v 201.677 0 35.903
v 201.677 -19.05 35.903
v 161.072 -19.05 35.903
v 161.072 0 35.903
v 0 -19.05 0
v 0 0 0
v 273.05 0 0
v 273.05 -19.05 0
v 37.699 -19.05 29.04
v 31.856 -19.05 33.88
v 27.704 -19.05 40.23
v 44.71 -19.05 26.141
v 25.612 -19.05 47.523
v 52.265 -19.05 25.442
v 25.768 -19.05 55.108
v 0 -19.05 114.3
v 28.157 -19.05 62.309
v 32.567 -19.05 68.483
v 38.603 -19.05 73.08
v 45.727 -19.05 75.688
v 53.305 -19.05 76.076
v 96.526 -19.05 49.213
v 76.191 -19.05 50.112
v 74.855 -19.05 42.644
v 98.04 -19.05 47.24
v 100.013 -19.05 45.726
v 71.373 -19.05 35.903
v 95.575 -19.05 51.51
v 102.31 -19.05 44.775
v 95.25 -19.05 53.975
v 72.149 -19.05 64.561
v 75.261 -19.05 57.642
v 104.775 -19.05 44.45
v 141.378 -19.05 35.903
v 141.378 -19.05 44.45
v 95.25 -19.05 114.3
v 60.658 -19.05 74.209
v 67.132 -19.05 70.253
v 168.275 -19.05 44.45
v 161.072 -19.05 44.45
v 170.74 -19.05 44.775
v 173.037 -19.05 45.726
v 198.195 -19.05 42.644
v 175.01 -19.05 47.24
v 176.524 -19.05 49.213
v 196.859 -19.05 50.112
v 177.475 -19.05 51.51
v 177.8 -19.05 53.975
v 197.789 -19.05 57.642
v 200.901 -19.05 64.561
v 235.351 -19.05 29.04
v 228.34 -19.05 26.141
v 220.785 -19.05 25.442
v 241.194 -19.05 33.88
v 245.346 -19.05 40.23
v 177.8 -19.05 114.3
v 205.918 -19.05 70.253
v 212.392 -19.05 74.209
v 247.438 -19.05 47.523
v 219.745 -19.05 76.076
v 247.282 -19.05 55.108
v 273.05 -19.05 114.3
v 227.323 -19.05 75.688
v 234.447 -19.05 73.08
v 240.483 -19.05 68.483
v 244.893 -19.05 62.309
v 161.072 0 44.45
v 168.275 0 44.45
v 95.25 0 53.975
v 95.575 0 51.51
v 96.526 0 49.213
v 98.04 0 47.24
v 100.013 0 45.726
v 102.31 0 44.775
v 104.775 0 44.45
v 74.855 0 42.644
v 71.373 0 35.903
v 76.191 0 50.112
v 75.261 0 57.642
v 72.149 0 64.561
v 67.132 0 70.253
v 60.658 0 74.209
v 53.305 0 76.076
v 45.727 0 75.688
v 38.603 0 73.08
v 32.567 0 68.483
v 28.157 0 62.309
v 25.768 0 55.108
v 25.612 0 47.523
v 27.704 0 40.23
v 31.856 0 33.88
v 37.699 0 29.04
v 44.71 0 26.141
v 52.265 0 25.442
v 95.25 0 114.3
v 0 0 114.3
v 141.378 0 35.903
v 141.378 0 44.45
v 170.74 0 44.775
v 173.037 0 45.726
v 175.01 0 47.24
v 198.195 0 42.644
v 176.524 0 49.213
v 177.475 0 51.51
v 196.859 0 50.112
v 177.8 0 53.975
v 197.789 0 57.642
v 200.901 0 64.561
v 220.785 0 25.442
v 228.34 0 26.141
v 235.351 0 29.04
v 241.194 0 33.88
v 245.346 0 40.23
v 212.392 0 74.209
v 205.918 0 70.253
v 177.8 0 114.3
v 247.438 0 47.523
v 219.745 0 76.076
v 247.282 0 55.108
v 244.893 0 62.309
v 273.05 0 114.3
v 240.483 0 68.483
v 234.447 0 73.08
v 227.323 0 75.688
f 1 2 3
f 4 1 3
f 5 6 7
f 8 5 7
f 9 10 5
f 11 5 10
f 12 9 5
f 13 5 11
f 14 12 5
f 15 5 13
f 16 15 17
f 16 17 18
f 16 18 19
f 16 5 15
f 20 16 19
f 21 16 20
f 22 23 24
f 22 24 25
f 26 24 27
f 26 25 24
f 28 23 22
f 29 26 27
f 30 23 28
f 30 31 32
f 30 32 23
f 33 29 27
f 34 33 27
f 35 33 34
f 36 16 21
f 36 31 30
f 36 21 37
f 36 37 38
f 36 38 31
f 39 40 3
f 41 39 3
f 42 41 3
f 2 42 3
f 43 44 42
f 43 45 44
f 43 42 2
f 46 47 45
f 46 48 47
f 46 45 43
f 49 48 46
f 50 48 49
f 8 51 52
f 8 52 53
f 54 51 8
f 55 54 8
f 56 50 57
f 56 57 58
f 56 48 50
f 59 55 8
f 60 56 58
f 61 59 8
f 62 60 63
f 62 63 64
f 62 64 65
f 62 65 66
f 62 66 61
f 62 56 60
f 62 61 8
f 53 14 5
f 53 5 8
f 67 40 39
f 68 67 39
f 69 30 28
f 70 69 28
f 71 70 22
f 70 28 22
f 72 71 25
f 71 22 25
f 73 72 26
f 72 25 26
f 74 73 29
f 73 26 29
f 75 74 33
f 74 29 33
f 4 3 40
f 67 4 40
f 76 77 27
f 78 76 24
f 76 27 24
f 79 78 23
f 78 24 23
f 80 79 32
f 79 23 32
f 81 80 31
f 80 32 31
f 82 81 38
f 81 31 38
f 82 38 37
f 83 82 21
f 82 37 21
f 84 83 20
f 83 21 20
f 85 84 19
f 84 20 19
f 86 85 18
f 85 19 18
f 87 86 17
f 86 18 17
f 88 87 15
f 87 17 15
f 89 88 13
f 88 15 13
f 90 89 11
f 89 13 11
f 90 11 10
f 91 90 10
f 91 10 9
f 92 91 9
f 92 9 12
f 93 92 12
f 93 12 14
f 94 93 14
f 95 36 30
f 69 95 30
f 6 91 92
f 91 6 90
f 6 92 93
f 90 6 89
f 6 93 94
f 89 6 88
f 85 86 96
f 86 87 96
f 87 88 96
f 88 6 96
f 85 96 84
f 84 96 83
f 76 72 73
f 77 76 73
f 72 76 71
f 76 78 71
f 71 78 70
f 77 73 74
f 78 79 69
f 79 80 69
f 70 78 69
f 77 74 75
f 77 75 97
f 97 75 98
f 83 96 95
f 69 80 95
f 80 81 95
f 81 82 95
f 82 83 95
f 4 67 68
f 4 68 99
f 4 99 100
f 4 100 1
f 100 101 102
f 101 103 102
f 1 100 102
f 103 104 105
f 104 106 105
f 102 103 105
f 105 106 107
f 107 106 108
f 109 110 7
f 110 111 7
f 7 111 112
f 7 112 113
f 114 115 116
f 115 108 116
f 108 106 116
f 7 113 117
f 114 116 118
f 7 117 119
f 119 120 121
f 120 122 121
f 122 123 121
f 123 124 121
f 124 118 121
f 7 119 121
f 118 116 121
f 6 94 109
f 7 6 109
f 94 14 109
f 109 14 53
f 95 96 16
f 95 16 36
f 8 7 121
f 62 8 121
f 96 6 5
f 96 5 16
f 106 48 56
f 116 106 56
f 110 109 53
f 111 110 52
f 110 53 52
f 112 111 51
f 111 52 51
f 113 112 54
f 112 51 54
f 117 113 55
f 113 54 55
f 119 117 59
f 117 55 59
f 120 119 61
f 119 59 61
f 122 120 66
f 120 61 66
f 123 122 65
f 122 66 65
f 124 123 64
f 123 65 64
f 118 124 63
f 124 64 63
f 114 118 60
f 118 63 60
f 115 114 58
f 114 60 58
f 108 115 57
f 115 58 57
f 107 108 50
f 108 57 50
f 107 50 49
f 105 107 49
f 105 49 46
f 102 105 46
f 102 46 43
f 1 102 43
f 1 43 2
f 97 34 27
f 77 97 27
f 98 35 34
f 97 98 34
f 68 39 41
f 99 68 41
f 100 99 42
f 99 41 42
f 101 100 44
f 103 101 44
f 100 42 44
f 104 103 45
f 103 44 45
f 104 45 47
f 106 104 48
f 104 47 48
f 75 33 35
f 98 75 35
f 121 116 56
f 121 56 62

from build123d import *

# Parameters (mm, degrees)
F0_W     = 273.05
F0_H     = 114.3
F1_DEPTH = 19.05
F2_R     = 25.4
F3_DEPTH = 25.4
F5_DEPTH = 25.4
F7_DEPTH = 25.4


with BuildPart() as f1:
    # F0 (on Front) → F1 (new body)
    with BuildSketch(Plane.XZ):
        with Locations((136.525, 57.15)):
            Rectangle(F0_W, F0_H)
    extrude(amount=F1_DEPTH)

    # F2 (on face) → F3 (cut)
    with BuildSketch(Plane.XZ.offset(19.05)):
        with Locations((50.8, 50.8)):
            Circle(F2_R)
        with Locations((222.25, 50.8)):
            Circle(F2_R)
    extrude(amount=-F3_DEPTH, mode=Mode.SUBTRACT)

    # F4 (on face) → F5 (cut)
    with BuildSketch(Plane.XZ.offset(19.05)):
        with BuildLine():
            Line((177.8, 114.3), (95.25, 114.3))
            Line((95.25, 114.3), (95.25, 53.975))
            ThreePointArc((95.25, 53.975), (98.039808, 47.239808), (104.775, 44.45))
            Line((104.775, 44.45), (168.275, 44.45))
            ThreePointArc((168.275, 44.45), (175.010192, 47.239808), (177.8, 53.975))
            Line((177.8, 53.975), (177.8, 114.3))
        make_face()
    extrude(amount=-F5_DEPTH, mode=Mode.SUBTRACT)

    # F6 (on face) → F7 (cut)
    with BuildSketch(Plane.XZ.offset(19.05)):
        Polygon((71.372664, 35.902836), (49.335122, 25.442277), (223.714878, 25.442277), (201.677336, 35.902836), (161.071733, 35.902836), (161.071733, 44.45), (141.377911, 44.45), (141.377911, 35.902836), align=None)
    extrude(amount=-F7_DEPTH, mode=Mode.SUBTRACT)


solid = f1.part
